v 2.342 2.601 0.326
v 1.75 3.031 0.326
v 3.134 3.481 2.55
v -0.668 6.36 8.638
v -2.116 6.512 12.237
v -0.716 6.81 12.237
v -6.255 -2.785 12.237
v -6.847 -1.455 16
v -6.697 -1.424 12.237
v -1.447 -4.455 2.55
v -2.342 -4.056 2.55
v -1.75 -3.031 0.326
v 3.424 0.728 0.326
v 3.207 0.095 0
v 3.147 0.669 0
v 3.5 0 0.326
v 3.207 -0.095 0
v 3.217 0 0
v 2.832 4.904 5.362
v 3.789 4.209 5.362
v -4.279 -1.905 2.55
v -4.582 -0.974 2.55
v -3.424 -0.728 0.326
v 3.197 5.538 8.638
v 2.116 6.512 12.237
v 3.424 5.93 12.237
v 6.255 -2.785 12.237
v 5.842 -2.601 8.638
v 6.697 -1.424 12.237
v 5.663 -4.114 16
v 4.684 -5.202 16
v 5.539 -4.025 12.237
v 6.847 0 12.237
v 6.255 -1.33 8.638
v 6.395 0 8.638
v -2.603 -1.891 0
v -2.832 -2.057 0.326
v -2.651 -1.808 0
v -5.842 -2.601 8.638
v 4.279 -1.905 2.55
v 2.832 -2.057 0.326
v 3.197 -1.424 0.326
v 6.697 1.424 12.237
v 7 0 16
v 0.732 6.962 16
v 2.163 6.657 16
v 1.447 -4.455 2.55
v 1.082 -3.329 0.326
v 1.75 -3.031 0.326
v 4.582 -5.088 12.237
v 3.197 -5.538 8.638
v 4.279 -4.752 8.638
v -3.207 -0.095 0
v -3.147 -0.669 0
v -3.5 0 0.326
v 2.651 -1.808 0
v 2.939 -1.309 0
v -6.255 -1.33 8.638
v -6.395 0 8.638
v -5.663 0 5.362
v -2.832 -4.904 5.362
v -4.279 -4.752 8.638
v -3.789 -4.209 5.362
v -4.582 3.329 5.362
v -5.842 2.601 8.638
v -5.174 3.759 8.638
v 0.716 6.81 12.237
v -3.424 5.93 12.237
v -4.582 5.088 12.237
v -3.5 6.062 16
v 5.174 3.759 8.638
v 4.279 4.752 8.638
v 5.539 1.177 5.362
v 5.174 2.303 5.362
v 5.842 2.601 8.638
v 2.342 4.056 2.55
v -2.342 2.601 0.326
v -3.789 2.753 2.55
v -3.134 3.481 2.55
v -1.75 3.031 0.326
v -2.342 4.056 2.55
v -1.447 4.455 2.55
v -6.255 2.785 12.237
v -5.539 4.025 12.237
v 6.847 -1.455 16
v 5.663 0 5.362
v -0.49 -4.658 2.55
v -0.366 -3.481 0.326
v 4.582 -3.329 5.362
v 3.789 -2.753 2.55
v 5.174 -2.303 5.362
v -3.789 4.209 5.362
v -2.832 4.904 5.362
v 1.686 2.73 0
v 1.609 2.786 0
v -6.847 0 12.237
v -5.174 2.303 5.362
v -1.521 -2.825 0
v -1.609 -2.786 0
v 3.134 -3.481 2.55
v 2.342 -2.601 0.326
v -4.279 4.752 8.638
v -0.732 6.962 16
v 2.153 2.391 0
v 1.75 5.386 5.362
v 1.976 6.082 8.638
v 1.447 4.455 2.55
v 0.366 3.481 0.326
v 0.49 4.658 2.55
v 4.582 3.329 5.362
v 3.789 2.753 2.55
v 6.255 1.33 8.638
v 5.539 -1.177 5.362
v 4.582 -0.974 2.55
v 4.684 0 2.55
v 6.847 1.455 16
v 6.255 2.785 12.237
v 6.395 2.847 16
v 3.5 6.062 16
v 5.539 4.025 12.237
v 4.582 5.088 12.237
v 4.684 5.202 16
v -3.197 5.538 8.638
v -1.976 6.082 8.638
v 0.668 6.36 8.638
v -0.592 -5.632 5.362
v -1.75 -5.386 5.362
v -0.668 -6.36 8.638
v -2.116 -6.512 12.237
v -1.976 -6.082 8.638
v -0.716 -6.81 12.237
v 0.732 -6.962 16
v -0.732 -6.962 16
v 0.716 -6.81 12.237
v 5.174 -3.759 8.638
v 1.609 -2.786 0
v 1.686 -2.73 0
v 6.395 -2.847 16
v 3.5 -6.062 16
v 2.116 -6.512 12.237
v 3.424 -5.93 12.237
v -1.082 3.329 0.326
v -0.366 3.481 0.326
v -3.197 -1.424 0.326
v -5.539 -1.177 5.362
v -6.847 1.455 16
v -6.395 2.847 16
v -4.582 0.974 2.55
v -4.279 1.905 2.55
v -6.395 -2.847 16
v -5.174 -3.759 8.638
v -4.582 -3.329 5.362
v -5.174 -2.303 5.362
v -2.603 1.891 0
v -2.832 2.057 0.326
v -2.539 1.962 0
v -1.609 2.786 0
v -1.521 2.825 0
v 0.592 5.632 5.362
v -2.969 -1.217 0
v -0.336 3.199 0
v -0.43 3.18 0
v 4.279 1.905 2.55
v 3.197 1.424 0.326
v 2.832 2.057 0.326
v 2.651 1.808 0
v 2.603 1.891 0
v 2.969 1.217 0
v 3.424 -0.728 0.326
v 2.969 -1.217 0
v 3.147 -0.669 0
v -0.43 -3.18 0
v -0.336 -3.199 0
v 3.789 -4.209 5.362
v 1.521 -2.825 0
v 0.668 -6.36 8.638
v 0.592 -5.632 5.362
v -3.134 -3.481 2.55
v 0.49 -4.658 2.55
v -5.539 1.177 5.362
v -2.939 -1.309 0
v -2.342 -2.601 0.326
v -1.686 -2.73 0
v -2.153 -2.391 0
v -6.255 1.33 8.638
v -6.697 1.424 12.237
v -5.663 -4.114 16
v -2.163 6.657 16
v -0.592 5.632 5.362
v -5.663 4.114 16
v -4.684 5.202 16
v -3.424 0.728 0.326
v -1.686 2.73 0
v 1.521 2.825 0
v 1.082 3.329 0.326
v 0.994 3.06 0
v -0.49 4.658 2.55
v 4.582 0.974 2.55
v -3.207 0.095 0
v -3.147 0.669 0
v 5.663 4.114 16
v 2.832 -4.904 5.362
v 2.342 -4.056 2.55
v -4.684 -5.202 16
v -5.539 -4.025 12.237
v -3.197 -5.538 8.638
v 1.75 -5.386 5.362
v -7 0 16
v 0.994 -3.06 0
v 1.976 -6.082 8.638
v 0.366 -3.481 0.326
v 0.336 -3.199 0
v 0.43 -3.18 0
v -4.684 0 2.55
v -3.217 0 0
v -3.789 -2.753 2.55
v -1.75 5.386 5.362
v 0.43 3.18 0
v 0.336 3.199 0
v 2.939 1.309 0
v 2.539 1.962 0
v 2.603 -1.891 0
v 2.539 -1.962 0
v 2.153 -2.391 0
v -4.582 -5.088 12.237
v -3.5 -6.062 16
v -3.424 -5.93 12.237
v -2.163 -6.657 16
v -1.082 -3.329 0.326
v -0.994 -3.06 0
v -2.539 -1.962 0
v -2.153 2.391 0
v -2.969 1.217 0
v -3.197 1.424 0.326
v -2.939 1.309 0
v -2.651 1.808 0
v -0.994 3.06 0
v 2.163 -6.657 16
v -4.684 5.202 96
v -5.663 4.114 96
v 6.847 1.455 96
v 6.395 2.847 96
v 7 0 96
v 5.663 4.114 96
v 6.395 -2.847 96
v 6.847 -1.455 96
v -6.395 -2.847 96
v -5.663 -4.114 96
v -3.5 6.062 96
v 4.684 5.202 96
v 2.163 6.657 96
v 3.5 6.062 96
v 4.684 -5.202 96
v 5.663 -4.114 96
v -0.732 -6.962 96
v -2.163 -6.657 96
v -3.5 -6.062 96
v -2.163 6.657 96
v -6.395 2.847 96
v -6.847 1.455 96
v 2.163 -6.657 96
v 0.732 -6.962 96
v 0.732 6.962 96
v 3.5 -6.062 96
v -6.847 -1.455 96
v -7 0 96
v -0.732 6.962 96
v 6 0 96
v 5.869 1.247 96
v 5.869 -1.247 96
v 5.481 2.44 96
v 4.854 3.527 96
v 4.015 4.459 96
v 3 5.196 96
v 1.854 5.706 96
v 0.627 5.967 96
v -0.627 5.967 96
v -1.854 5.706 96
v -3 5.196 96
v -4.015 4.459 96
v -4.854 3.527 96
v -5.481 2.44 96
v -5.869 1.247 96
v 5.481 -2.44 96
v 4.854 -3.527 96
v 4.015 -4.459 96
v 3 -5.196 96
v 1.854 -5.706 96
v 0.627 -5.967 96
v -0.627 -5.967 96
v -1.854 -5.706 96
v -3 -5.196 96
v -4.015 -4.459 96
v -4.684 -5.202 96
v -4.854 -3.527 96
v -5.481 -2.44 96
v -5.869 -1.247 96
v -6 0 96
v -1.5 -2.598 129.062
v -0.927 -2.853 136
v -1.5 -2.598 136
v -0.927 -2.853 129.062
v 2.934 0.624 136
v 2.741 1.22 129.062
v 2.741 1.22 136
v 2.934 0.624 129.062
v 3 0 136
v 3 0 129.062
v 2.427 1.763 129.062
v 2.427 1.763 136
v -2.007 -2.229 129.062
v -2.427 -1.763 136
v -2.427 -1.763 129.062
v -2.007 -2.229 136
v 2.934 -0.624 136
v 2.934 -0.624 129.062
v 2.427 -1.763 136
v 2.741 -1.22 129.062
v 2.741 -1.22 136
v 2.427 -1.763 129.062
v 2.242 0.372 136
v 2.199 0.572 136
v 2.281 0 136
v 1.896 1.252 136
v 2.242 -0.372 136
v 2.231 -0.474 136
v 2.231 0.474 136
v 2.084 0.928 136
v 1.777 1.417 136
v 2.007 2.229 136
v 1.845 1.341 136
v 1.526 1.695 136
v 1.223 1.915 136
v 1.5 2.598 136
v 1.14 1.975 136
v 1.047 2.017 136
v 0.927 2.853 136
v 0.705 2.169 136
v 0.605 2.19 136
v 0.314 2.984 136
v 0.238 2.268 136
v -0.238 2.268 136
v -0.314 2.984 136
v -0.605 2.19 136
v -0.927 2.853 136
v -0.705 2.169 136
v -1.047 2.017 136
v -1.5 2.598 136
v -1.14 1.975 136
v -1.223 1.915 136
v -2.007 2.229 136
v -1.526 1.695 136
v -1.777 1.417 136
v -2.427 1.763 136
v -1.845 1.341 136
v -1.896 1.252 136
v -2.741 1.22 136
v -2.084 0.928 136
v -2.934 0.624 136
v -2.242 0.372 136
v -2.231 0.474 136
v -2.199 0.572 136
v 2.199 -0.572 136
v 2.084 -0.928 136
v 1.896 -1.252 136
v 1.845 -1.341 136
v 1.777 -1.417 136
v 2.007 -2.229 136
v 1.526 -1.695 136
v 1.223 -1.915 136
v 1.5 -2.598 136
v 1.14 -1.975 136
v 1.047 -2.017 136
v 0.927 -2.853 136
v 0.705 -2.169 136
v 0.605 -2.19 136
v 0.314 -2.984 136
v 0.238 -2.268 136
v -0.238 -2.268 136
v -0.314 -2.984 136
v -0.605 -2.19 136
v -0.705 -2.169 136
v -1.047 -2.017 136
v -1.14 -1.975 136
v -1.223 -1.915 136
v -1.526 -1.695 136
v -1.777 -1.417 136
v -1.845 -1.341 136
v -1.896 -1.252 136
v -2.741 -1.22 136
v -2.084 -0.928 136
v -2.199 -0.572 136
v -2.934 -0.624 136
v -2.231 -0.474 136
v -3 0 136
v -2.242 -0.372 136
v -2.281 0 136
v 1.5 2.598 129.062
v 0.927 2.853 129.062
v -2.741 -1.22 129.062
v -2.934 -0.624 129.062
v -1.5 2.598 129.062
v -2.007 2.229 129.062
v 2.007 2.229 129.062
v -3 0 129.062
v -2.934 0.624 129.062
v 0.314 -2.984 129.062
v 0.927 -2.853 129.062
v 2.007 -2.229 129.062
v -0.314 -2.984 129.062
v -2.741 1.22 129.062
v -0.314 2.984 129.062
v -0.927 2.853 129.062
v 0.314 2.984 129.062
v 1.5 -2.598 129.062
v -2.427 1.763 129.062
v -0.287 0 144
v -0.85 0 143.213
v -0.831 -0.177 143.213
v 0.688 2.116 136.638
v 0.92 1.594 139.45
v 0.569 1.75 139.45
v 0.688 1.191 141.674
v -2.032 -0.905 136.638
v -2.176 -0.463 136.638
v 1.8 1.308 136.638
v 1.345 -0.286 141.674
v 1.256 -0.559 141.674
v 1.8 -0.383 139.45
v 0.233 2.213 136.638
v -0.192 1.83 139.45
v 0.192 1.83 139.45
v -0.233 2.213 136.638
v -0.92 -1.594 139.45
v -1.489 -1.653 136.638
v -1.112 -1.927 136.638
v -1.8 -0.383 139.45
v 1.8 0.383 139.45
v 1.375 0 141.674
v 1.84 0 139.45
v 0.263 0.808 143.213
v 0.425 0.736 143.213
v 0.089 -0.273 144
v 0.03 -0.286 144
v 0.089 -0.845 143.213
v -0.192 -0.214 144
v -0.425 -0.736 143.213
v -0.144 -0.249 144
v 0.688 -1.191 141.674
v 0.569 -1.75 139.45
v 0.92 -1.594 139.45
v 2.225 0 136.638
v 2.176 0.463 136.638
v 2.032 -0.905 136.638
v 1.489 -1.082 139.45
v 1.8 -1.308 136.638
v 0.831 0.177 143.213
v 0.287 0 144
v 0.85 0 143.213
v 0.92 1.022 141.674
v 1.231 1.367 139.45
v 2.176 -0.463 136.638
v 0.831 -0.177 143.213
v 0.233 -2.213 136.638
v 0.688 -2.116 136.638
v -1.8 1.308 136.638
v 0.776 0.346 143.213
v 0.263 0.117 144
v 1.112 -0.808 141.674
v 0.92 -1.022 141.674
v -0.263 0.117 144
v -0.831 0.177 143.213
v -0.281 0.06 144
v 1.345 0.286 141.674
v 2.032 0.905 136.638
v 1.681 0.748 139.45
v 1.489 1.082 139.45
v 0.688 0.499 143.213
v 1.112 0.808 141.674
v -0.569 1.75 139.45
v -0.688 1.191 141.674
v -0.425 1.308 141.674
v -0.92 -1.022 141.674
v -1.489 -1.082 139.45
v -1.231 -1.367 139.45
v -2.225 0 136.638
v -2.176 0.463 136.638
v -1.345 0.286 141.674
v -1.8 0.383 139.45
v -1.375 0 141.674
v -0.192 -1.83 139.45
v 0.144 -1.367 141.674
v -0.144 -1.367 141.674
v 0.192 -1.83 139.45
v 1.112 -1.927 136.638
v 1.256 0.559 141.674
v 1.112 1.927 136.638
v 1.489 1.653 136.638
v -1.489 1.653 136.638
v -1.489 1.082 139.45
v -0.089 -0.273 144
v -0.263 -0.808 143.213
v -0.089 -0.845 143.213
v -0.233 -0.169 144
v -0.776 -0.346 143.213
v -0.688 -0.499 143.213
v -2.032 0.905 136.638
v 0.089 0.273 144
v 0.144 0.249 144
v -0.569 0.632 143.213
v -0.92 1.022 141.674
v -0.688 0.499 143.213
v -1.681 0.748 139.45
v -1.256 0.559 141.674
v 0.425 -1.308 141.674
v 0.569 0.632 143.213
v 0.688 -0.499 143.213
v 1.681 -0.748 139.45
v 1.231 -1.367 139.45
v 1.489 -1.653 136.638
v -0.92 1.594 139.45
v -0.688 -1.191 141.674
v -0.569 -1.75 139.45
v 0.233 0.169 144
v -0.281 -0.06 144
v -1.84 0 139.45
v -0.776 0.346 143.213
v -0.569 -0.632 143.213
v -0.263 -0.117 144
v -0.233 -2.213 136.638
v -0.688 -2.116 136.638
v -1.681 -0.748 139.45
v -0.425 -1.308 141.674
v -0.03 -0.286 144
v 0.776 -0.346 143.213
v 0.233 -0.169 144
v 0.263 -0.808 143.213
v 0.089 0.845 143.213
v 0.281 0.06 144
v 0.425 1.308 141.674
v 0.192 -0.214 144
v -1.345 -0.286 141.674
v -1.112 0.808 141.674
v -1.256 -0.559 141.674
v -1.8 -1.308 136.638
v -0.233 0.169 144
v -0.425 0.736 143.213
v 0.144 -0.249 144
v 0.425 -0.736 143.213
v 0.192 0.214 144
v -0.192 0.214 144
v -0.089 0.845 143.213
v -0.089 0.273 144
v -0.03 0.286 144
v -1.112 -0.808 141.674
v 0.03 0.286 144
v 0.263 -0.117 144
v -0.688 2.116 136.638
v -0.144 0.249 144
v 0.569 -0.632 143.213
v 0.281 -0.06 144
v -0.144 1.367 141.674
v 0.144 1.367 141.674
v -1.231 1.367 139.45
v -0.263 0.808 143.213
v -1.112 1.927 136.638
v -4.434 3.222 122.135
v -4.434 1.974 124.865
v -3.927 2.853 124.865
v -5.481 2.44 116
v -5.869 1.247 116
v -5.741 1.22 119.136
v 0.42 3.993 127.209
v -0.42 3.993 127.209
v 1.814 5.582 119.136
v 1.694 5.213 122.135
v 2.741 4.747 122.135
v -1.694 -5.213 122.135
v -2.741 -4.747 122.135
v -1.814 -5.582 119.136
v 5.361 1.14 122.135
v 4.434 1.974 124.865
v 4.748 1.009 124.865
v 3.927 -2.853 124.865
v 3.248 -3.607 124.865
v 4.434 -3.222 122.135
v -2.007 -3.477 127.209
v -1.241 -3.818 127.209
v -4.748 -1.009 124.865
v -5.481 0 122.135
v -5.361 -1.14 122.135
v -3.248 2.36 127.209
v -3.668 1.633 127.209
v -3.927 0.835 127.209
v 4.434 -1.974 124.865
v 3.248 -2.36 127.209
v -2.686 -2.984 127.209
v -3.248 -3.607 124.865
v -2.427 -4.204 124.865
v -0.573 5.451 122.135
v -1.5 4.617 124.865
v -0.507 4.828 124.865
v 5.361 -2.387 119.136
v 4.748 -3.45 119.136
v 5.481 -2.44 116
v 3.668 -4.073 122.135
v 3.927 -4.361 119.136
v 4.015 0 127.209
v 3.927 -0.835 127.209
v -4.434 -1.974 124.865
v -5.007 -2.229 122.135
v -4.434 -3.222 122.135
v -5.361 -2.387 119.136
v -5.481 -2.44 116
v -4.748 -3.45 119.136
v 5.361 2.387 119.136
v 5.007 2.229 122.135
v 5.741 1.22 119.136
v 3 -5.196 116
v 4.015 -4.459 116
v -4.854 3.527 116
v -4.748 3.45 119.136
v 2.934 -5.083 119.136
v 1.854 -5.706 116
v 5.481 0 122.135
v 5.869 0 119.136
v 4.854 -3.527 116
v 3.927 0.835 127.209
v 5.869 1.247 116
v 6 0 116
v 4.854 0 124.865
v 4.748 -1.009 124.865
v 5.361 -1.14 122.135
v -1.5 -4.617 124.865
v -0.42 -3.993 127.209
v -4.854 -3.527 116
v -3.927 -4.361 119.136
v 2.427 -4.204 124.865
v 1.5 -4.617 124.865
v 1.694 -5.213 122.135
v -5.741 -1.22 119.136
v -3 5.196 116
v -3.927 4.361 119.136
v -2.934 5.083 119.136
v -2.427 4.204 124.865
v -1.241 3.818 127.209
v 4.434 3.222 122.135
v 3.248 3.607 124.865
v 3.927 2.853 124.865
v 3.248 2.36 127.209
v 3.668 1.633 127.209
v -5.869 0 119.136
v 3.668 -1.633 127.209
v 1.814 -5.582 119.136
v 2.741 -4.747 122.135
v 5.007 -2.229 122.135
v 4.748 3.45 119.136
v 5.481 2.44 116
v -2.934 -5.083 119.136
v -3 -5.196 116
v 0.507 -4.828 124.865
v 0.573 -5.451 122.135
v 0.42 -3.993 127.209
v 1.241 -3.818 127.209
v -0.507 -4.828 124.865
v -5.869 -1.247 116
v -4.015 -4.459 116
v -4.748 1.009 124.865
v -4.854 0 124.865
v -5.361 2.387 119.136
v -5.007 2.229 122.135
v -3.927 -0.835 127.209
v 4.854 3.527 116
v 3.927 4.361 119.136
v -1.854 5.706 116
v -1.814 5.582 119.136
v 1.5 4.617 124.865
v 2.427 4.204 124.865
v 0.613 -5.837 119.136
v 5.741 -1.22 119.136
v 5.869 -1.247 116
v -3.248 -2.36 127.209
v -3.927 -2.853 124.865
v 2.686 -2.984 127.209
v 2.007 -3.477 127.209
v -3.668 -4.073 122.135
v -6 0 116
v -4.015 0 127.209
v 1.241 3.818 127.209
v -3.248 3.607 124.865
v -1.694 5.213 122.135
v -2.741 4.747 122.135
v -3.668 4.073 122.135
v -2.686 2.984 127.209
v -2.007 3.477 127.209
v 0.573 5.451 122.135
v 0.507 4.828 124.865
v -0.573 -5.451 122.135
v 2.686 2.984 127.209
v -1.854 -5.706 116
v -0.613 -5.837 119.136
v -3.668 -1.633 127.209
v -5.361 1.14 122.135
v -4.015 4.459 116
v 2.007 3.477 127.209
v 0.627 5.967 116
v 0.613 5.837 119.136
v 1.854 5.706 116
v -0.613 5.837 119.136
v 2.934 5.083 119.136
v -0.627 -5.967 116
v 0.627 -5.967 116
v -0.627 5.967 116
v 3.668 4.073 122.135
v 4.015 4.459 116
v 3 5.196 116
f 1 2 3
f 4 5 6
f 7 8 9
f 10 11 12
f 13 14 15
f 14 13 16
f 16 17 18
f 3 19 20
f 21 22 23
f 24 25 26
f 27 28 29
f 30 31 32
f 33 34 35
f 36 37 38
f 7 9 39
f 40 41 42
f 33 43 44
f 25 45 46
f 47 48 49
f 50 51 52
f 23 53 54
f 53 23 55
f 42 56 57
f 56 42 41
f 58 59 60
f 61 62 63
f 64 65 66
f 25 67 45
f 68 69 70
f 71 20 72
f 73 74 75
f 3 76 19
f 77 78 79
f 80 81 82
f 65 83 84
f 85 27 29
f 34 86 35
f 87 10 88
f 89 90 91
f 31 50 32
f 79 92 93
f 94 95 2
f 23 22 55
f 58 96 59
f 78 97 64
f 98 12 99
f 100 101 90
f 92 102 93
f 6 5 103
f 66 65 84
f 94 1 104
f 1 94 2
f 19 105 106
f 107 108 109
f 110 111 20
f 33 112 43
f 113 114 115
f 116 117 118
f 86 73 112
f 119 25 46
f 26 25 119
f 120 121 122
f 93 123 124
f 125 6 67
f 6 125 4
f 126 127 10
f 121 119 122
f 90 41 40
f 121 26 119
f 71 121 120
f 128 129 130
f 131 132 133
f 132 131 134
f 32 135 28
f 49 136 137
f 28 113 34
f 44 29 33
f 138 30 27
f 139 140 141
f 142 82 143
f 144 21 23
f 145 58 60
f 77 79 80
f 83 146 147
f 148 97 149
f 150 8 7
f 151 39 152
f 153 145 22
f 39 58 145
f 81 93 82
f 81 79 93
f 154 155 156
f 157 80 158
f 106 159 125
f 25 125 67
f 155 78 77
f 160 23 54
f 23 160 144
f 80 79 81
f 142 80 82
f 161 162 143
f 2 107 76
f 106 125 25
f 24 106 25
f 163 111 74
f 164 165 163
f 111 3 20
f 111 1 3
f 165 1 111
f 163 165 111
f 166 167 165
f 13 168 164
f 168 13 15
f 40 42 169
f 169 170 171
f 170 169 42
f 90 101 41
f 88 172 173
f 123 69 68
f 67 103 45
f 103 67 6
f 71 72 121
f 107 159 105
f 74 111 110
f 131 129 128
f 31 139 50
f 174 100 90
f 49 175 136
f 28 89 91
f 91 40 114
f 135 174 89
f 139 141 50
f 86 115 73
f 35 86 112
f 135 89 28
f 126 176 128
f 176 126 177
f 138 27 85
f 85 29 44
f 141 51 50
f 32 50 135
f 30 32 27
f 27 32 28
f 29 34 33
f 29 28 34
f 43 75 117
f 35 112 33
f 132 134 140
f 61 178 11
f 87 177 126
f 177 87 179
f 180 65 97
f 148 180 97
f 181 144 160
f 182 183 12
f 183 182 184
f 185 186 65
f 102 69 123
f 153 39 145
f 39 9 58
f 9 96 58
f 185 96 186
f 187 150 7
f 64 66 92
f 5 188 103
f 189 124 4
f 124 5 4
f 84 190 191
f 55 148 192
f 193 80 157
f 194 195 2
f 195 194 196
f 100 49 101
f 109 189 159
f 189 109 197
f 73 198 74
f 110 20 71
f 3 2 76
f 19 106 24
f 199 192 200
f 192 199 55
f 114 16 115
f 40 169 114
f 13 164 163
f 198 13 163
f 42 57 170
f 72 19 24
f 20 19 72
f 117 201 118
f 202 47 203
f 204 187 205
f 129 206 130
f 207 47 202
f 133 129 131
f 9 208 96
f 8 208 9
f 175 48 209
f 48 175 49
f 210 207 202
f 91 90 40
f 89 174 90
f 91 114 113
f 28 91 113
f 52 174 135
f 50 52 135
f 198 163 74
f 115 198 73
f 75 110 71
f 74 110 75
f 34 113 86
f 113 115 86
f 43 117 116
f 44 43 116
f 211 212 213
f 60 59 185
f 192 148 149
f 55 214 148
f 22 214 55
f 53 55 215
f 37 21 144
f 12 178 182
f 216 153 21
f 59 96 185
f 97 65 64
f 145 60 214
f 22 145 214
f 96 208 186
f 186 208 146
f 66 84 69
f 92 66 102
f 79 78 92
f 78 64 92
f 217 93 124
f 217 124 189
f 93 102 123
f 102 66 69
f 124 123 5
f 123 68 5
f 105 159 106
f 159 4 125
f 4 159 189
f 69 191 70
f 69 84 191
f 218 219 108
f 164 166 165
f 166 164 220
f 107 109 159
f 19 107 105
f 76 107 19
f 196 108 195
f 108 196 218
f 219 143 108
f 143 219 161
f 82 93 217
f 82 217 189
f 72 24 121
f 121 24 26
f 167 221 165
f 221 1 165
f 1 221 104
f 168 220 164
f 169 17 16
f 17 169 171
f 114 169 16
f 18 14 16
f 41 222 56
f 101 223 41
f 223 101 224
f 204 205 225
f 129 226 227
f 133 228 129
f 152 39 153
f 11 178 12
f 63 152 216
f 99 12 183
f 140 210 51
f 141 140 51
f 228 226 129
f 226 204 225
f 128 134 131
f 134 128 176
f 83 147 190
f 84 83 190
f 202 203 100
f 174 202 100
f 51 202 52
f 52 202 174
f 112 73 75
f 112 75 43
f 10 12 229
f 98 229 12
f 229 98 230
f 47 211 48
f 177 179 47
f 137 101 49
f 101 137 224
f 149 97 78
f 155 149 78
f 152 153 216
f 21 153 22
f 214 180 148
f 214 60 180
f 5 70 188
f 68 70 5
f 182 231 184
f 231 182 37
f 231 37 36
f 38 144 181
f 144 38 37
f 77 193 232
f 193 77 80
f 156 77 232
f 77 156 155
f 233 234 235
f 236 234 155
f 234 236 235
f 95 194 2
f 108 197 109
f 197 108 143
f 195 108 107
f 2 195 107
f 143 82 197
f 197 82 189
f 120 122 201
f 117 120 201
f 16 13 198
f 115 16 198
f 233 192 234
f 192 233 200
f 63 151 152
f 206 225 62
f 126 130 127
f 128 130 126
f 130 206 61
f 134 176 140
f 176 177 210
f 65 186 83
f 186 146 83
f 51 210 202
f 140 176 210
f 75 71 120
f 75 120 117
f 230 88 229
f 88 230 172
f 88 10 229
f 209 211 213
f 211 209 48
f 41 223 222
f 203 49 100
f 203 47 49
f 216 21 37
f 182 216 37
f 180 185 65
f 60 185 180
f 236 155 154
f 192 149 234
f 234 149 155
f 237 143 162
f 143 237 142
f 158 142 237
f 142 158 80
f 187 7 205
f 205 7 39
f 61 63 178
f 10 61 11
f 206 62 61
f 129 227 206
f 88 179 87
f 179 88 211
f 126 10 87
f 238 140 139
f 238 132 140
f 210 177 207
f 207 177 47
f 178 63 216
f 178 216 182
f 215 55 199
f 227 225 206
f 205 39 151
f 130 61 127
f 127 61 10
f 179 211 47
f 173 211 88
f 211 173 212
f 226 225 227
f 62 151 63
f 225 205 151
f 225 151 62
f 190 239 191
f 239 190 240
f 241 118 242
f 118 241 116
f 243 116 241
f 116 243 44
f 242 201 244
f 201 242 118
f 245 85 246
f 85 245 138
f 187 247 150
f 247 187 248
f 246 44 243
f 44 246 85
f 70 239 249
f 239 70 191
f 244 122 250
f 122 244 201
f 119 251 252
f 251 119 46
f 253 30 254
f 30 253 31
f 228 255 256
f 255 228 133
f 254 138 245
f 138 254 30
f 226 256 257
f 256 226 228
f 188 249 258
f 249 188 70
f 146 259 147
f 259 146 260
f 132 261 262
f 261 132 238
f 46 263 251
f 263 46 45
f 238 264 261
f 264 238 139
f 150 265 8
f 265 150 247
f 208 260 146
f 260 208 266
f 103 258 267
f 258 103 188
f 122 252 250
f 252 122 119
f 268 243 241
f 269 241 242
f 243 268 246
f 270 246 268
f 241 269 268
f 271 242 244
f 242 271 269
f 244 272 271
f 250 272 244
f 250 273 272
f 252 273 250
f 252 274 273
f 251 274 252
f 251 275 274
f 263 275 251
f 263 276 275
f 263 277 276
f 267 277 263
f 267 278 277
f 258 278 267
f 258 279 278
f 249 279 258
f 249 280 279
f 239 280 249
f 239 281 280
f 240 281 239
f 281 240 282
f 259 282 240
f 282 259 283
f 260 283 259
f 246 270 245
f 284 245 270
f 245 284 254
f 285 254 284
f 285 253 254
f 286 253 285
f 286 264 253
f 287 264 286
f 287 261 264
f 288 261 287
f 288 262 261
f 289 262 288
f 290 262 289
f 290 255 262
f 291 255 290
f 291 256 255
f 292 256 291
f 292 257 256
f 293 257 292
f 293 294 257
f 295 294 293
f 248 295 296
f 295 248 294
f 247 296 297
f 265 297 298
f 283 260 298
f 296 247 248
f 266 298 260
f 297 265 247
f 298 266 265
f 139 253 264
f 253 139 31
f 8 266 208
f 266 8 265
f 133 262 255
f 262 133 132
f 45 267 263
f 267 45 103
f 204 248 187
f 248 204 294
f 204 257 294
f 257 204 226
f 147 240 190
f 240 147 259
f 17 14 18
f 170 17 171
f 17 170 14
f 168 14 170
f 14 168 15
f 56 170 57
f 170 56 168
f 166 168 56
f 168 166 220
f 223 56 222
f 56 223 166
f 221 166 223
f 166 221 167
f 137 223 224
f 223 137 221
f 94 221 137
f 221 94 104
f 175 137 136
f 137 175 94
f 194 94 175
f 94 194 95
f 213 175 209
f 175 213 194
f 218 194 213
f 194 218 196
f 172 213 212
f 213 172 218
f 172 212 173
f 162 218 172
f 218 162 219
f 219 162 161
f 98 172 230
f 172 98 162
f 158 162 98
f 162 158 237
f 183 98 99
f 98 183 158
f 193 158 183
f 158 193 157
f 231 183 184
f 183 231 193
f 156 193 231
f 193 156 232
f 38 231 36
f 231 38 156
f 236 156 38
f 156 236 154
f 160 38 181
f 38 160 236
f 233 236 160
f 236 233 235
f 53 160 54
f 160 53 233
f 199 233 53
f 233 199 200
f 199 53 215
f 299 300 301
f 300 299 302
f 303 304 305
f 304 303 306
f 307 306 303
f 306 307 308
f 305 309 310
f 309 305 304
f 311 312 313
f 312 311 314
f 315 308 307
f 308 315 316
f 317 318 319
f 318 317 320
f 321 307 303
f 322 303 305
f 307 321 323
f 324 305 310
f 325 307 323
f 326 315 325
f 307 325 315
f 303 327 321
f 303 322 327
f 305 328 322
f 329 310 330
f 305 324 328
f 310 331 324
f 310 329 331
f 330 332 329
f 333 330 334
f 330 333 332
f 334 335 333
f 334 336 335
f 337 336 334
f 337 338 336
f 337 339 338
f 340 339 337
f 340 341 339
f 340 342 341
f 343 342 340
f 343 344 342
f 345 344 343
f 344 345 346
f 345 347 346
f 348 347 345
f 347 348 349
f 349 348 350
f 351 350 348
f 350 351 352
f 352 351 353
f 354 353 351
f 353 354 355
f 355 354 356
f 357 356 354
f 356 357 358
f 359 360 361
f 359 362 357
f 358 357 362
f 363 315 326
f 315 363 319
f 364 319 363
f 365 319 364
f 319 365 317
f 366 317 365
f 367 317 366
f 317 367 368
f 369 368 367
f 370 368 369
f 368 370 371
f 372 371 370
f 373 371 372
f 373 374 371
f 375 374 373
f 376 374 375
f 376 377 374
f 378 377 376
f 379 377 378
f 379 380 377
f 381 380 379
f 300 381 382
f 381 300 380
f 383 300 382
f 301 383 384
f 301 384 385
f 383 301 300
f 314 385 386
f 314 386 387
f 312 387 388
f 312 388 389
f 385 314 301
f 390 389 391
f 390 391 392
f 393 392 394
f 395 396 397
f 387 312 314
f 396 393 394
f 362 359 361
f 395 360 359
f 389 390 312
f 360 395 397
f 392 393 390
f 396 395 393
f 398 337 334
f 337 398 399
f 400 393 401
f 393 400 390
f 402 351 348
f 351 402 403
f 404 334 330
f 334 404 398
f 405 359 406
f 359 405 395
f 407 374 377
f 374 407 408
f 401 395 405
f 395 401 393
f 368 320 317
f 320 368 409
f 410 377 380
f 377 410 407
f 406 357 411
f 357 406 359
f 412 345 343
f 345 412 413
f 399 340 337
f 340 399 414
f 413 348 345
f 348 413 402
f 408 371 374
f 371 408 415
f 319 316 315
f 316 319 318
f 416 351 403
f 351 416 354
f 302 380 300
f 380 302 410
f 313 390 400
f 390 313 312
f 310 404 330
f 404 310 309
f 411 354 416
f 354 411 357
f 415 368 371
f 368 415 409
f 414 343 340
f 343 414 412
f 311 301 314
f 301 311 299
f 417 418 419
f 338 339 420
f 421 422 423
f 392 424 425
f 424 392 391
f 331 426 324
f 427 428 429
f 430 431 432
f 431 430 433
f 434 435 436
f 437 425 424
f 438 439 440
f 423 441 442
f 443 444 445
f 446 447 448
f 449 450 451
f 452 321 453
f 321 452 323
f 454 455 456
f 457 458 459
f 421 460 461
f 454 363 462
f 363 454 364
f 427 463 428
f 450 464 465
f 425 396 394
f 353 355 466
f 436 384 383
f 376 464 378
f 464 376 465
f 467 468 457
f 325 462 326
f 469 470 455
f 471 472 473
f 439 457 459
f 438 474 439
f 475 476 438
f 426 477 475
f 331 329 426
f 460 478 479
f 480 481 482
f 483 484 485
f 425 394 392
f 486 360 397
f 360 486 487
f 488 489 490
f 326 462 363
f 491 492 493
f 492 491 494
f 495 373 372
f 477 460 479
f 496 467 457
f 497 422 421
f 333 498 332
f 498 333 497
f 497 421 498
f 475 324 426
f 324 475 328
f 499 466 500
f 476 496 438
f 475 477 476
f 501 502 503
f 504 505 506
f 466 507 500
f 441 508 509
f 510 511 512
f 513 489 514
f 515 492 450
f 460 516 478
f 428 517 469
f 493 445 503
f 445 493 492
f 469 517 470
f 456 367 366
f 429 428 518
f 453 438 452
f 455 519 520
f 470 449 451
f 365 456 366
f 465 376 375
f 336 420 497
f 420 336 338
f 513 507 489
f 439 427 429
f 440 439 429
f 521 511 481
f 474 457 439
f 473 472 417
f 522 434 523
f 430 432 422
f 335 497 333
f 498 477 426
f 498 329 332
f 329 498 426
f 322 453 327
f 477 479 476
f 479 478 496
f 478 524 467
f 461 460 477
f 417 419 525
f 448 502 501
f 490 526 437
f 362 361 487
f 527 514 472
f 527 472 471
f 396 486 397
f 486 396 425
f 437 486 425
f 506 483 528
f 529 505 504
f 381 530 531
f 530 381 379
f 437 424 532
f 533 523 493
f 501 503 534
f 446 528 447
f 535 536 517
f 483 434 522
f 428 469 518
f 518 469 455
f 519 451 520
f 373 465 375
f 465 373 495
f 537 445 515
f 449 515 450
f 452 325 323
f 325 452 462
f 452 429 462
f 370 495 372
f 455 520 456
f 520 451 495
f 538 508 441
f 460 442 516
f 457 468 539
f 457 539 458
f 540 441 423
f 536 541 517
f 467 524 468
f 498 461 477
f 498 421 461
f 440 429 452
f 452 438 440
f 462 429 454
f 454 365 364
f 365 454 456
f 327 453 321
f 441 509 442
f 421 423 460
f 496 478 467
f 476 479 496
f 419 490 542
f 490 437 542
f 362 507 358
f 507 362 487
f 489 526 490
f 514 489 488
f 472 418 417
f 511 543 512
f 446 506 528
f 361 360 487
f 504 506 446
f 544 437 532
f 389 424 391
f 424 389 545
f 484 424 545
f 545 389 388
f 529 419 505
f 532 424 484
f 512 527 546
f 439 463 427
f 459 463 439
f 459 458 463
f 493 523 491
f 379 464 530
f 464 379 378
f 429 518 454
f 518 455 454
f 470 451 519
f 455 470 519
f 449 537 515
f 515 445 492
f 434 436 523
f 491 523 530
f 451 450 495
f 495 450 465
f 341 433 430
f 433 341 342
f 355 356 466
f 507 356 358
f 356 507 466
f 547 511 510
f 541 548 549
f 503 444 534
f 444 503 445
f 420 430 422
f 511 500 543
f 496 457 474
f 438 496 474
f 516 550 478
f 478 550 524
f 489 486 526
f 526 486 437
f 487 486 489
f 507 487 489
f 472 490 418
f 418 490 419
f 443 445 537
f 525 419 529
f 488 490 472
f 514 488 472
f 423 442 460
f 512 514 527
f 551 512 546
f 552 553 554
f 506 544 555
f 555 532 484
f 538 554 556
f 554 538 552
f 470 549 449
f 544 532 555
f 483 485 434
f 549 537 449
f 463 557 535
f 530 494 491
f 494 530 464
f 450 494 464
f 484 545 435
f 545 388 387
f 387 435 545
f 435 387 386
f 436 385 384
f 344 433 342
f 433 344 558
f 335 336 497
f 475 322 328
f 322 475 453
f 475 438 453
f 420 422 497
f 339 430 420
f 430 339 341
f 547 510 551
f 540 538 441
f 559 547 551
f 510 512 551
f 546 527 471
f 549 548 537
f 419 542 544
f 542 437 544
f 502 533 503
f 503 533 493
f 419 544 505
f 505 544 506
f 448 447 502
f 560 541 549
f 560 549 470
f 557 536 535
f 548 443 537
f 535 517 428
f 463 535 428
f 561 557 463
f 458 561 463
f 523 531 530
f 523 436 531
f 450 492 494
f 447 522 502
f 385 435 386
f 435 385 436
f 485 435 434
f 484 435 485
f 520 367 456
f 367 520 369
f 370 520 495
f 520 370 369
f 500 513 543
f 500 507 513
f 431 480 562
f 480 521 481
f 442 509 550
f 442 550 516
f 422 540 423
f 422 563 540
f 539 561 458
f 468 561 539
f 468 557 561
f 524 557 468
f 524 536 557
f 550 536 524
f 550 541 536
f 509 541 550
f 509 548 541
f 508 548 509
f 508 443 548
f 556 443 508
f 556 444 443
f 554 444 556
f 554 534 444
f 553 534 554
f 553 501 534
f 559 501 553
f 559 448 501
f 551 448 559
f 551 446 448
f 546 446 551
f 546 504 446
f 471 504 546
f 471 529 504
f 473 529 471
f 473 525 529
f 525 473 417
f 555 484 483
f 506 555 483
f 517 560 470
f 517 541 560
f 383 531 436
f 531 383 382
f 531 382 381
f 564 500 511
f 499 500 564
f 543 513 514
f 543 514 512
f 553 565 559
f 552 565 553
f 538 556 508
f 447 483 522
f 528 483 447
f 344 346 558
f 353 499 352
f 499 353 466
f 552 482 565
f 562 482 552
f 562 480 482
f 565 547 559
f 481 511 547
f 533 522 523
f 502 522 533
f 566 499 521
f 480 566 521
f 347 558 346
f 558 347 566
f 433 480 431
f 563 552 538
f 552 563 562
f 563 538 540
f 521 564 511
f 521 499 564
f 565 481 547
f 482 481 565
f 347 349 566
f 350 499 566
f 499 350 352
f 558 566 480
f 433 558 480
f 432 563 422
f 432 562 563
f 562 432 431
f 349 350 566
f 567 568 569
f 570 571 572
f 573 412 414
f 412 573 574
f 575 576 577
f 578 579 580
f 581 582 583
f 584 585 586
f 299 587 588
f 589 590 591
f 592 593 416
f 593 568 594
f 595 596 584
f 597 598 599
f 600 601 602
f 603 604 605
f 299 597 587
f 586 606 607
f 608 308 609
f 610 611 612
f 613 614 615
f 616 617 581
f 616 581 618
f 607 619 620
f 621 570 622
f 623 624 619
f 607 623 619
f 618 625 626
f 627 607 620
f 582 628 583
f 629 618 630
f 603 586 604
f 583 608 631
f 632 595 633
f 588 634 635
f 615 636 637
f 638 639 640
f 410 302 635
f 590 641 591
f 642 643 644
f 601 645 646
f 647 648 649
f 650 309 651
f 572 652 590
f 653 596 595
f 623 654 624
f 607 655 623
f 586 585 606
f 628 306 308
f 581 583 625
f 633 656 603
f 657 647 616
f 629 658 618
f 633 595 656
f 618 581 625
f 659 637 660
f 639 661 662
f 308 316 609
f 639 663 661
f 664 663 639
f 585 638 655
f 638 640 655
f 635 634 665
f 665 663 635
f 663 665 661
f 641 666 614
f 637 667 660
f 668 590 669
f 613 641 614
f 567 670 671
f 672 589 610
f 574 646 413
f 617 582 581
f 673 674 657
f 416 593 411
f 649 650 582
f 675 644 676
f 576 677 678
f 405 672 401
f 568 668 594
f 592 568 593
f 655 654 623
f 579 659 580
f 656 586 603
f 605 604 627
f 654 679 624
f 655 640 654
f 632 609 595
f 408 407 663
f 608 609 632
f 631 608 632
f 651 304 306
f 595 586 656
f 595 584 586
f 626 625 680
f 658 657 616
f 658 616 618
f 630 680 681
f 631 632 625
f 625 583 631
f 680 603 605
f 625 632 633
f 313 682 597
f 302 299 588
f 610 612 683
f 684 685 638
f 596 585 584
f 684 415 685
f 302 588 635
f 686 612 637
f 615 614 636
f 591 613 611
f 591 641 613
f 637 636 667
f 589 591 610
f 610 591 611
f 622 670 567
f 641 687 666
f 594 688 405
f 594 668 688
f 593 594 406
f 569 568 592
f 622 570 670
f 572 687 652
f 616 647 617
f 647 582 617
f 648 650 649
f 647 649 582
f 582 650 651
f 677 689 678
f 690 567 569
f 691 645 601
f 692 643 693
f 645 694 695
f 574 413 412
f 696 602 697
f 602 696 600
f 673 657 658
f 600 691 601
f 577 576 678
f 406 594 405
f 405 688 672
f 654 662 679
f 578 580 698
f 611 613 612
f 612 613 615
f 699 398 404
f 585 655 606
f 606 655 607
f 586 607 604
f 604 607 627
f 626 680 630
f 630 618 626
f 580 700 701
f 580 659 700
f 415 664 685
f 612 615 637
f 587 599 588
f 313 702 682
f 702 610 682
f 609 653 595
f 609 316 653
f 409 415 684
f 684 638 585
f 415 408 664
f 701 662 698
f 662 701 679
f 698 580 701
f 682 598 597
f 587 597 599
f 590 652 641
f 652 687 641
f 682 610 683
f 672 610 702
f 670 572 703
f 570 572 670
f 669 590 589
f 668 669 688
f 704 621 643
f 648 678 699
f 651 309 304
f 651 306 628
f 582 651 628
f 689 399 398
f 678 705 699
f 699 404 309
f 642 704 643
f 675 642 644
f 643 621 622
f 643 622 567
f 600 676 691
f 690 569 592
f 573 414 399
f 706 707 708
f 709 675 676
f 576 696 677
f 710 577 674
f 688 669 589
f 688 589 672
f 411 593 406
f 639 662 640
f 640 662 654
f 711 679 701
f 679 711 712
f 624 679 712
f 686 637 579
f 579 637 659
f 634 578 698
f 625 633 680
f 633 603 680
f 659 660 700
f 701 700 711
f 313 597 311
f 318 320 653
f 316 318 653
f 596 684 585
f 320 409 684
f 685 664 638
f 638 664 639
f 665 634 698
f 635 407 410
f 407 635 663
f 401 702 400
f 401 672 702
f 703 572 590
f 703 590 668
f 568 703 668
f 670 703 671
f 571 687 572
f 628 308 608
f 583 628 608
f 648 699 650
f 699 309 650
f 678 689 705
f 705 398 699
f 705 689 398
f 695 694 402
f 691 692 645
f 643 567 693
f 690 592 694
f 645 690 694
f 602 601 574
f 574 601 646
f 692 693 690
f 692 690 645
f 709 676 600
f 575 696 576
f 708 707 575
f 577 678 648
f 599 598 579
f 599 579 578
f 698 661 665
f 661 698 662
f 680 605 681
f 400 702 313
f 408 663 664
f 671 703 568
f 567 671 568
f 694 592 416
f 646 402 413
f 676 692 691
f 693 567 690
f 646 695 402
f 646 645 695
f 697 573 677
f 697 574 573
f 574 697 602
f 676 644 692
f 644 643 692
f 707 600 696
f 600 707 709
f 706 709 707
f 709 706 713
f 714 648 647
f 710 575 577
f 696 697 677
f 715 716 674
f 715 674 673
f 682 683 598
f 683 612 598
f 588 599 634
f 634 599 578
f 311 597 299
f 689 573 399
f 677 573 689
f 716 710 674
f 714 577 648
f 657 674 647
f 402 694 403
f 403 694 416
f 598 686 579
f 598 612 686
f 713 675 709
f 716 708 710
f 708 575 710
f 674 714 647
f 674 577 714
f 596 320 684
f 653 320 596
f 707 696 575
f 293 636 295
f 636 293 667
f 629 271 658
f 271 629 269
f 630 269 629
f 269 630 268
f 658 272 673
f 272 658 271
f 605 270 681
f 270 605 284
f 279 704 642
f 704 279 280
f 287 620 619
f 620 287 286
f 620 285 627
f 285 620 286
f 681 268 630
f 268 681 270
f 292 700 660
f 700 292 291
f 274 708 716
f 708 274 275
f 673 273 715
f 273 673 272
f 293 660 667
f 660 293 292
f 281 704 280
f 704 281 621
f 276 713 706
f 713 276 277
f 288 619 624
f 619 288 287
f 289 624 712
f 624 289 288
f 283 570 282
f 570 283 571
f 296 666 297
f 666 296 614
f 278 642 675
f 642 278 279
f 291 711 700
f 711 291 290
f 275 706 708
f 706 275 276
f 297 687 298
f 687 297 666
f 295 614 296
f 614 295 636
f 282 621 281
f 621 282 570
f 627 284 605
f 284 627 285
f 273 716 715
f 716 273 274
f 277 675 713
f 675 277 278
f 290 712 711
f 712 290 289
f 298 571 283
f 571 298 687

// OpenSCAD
difference()
{
    translate([ 0, 0, 16 ])
    {
        resize([ 0, 0, 36 ])
        {
            sphere(r = 7, $fs = 0.1);
        }
        cylinder(h = 80, r = 7, $fs = 0.1);
    }

    translate([ 0, 0, -2 ])
    {
        cylinder(h = 2, r = 6, $fs = 0.1);
    }
}
translate([ 0, 0, 96 ])
{
    cylinder(h = 20, r = 6, $fs = 0.1);
    translate([ 0, 0, 20 ])
    {
        resize([ 0, 0, 30 ])
        {
            sphere(r = 6, $fs = 0.1);
        }
        translate([ 0, 0, 10 ])
        {
            cylinder(h = 10, r = 3, $fs = 0.1);
            resize([ 0, 0, 36 ])
            {
                sphere(r = 2.75, $fs = 0.1);
            }
        }
    }
}
